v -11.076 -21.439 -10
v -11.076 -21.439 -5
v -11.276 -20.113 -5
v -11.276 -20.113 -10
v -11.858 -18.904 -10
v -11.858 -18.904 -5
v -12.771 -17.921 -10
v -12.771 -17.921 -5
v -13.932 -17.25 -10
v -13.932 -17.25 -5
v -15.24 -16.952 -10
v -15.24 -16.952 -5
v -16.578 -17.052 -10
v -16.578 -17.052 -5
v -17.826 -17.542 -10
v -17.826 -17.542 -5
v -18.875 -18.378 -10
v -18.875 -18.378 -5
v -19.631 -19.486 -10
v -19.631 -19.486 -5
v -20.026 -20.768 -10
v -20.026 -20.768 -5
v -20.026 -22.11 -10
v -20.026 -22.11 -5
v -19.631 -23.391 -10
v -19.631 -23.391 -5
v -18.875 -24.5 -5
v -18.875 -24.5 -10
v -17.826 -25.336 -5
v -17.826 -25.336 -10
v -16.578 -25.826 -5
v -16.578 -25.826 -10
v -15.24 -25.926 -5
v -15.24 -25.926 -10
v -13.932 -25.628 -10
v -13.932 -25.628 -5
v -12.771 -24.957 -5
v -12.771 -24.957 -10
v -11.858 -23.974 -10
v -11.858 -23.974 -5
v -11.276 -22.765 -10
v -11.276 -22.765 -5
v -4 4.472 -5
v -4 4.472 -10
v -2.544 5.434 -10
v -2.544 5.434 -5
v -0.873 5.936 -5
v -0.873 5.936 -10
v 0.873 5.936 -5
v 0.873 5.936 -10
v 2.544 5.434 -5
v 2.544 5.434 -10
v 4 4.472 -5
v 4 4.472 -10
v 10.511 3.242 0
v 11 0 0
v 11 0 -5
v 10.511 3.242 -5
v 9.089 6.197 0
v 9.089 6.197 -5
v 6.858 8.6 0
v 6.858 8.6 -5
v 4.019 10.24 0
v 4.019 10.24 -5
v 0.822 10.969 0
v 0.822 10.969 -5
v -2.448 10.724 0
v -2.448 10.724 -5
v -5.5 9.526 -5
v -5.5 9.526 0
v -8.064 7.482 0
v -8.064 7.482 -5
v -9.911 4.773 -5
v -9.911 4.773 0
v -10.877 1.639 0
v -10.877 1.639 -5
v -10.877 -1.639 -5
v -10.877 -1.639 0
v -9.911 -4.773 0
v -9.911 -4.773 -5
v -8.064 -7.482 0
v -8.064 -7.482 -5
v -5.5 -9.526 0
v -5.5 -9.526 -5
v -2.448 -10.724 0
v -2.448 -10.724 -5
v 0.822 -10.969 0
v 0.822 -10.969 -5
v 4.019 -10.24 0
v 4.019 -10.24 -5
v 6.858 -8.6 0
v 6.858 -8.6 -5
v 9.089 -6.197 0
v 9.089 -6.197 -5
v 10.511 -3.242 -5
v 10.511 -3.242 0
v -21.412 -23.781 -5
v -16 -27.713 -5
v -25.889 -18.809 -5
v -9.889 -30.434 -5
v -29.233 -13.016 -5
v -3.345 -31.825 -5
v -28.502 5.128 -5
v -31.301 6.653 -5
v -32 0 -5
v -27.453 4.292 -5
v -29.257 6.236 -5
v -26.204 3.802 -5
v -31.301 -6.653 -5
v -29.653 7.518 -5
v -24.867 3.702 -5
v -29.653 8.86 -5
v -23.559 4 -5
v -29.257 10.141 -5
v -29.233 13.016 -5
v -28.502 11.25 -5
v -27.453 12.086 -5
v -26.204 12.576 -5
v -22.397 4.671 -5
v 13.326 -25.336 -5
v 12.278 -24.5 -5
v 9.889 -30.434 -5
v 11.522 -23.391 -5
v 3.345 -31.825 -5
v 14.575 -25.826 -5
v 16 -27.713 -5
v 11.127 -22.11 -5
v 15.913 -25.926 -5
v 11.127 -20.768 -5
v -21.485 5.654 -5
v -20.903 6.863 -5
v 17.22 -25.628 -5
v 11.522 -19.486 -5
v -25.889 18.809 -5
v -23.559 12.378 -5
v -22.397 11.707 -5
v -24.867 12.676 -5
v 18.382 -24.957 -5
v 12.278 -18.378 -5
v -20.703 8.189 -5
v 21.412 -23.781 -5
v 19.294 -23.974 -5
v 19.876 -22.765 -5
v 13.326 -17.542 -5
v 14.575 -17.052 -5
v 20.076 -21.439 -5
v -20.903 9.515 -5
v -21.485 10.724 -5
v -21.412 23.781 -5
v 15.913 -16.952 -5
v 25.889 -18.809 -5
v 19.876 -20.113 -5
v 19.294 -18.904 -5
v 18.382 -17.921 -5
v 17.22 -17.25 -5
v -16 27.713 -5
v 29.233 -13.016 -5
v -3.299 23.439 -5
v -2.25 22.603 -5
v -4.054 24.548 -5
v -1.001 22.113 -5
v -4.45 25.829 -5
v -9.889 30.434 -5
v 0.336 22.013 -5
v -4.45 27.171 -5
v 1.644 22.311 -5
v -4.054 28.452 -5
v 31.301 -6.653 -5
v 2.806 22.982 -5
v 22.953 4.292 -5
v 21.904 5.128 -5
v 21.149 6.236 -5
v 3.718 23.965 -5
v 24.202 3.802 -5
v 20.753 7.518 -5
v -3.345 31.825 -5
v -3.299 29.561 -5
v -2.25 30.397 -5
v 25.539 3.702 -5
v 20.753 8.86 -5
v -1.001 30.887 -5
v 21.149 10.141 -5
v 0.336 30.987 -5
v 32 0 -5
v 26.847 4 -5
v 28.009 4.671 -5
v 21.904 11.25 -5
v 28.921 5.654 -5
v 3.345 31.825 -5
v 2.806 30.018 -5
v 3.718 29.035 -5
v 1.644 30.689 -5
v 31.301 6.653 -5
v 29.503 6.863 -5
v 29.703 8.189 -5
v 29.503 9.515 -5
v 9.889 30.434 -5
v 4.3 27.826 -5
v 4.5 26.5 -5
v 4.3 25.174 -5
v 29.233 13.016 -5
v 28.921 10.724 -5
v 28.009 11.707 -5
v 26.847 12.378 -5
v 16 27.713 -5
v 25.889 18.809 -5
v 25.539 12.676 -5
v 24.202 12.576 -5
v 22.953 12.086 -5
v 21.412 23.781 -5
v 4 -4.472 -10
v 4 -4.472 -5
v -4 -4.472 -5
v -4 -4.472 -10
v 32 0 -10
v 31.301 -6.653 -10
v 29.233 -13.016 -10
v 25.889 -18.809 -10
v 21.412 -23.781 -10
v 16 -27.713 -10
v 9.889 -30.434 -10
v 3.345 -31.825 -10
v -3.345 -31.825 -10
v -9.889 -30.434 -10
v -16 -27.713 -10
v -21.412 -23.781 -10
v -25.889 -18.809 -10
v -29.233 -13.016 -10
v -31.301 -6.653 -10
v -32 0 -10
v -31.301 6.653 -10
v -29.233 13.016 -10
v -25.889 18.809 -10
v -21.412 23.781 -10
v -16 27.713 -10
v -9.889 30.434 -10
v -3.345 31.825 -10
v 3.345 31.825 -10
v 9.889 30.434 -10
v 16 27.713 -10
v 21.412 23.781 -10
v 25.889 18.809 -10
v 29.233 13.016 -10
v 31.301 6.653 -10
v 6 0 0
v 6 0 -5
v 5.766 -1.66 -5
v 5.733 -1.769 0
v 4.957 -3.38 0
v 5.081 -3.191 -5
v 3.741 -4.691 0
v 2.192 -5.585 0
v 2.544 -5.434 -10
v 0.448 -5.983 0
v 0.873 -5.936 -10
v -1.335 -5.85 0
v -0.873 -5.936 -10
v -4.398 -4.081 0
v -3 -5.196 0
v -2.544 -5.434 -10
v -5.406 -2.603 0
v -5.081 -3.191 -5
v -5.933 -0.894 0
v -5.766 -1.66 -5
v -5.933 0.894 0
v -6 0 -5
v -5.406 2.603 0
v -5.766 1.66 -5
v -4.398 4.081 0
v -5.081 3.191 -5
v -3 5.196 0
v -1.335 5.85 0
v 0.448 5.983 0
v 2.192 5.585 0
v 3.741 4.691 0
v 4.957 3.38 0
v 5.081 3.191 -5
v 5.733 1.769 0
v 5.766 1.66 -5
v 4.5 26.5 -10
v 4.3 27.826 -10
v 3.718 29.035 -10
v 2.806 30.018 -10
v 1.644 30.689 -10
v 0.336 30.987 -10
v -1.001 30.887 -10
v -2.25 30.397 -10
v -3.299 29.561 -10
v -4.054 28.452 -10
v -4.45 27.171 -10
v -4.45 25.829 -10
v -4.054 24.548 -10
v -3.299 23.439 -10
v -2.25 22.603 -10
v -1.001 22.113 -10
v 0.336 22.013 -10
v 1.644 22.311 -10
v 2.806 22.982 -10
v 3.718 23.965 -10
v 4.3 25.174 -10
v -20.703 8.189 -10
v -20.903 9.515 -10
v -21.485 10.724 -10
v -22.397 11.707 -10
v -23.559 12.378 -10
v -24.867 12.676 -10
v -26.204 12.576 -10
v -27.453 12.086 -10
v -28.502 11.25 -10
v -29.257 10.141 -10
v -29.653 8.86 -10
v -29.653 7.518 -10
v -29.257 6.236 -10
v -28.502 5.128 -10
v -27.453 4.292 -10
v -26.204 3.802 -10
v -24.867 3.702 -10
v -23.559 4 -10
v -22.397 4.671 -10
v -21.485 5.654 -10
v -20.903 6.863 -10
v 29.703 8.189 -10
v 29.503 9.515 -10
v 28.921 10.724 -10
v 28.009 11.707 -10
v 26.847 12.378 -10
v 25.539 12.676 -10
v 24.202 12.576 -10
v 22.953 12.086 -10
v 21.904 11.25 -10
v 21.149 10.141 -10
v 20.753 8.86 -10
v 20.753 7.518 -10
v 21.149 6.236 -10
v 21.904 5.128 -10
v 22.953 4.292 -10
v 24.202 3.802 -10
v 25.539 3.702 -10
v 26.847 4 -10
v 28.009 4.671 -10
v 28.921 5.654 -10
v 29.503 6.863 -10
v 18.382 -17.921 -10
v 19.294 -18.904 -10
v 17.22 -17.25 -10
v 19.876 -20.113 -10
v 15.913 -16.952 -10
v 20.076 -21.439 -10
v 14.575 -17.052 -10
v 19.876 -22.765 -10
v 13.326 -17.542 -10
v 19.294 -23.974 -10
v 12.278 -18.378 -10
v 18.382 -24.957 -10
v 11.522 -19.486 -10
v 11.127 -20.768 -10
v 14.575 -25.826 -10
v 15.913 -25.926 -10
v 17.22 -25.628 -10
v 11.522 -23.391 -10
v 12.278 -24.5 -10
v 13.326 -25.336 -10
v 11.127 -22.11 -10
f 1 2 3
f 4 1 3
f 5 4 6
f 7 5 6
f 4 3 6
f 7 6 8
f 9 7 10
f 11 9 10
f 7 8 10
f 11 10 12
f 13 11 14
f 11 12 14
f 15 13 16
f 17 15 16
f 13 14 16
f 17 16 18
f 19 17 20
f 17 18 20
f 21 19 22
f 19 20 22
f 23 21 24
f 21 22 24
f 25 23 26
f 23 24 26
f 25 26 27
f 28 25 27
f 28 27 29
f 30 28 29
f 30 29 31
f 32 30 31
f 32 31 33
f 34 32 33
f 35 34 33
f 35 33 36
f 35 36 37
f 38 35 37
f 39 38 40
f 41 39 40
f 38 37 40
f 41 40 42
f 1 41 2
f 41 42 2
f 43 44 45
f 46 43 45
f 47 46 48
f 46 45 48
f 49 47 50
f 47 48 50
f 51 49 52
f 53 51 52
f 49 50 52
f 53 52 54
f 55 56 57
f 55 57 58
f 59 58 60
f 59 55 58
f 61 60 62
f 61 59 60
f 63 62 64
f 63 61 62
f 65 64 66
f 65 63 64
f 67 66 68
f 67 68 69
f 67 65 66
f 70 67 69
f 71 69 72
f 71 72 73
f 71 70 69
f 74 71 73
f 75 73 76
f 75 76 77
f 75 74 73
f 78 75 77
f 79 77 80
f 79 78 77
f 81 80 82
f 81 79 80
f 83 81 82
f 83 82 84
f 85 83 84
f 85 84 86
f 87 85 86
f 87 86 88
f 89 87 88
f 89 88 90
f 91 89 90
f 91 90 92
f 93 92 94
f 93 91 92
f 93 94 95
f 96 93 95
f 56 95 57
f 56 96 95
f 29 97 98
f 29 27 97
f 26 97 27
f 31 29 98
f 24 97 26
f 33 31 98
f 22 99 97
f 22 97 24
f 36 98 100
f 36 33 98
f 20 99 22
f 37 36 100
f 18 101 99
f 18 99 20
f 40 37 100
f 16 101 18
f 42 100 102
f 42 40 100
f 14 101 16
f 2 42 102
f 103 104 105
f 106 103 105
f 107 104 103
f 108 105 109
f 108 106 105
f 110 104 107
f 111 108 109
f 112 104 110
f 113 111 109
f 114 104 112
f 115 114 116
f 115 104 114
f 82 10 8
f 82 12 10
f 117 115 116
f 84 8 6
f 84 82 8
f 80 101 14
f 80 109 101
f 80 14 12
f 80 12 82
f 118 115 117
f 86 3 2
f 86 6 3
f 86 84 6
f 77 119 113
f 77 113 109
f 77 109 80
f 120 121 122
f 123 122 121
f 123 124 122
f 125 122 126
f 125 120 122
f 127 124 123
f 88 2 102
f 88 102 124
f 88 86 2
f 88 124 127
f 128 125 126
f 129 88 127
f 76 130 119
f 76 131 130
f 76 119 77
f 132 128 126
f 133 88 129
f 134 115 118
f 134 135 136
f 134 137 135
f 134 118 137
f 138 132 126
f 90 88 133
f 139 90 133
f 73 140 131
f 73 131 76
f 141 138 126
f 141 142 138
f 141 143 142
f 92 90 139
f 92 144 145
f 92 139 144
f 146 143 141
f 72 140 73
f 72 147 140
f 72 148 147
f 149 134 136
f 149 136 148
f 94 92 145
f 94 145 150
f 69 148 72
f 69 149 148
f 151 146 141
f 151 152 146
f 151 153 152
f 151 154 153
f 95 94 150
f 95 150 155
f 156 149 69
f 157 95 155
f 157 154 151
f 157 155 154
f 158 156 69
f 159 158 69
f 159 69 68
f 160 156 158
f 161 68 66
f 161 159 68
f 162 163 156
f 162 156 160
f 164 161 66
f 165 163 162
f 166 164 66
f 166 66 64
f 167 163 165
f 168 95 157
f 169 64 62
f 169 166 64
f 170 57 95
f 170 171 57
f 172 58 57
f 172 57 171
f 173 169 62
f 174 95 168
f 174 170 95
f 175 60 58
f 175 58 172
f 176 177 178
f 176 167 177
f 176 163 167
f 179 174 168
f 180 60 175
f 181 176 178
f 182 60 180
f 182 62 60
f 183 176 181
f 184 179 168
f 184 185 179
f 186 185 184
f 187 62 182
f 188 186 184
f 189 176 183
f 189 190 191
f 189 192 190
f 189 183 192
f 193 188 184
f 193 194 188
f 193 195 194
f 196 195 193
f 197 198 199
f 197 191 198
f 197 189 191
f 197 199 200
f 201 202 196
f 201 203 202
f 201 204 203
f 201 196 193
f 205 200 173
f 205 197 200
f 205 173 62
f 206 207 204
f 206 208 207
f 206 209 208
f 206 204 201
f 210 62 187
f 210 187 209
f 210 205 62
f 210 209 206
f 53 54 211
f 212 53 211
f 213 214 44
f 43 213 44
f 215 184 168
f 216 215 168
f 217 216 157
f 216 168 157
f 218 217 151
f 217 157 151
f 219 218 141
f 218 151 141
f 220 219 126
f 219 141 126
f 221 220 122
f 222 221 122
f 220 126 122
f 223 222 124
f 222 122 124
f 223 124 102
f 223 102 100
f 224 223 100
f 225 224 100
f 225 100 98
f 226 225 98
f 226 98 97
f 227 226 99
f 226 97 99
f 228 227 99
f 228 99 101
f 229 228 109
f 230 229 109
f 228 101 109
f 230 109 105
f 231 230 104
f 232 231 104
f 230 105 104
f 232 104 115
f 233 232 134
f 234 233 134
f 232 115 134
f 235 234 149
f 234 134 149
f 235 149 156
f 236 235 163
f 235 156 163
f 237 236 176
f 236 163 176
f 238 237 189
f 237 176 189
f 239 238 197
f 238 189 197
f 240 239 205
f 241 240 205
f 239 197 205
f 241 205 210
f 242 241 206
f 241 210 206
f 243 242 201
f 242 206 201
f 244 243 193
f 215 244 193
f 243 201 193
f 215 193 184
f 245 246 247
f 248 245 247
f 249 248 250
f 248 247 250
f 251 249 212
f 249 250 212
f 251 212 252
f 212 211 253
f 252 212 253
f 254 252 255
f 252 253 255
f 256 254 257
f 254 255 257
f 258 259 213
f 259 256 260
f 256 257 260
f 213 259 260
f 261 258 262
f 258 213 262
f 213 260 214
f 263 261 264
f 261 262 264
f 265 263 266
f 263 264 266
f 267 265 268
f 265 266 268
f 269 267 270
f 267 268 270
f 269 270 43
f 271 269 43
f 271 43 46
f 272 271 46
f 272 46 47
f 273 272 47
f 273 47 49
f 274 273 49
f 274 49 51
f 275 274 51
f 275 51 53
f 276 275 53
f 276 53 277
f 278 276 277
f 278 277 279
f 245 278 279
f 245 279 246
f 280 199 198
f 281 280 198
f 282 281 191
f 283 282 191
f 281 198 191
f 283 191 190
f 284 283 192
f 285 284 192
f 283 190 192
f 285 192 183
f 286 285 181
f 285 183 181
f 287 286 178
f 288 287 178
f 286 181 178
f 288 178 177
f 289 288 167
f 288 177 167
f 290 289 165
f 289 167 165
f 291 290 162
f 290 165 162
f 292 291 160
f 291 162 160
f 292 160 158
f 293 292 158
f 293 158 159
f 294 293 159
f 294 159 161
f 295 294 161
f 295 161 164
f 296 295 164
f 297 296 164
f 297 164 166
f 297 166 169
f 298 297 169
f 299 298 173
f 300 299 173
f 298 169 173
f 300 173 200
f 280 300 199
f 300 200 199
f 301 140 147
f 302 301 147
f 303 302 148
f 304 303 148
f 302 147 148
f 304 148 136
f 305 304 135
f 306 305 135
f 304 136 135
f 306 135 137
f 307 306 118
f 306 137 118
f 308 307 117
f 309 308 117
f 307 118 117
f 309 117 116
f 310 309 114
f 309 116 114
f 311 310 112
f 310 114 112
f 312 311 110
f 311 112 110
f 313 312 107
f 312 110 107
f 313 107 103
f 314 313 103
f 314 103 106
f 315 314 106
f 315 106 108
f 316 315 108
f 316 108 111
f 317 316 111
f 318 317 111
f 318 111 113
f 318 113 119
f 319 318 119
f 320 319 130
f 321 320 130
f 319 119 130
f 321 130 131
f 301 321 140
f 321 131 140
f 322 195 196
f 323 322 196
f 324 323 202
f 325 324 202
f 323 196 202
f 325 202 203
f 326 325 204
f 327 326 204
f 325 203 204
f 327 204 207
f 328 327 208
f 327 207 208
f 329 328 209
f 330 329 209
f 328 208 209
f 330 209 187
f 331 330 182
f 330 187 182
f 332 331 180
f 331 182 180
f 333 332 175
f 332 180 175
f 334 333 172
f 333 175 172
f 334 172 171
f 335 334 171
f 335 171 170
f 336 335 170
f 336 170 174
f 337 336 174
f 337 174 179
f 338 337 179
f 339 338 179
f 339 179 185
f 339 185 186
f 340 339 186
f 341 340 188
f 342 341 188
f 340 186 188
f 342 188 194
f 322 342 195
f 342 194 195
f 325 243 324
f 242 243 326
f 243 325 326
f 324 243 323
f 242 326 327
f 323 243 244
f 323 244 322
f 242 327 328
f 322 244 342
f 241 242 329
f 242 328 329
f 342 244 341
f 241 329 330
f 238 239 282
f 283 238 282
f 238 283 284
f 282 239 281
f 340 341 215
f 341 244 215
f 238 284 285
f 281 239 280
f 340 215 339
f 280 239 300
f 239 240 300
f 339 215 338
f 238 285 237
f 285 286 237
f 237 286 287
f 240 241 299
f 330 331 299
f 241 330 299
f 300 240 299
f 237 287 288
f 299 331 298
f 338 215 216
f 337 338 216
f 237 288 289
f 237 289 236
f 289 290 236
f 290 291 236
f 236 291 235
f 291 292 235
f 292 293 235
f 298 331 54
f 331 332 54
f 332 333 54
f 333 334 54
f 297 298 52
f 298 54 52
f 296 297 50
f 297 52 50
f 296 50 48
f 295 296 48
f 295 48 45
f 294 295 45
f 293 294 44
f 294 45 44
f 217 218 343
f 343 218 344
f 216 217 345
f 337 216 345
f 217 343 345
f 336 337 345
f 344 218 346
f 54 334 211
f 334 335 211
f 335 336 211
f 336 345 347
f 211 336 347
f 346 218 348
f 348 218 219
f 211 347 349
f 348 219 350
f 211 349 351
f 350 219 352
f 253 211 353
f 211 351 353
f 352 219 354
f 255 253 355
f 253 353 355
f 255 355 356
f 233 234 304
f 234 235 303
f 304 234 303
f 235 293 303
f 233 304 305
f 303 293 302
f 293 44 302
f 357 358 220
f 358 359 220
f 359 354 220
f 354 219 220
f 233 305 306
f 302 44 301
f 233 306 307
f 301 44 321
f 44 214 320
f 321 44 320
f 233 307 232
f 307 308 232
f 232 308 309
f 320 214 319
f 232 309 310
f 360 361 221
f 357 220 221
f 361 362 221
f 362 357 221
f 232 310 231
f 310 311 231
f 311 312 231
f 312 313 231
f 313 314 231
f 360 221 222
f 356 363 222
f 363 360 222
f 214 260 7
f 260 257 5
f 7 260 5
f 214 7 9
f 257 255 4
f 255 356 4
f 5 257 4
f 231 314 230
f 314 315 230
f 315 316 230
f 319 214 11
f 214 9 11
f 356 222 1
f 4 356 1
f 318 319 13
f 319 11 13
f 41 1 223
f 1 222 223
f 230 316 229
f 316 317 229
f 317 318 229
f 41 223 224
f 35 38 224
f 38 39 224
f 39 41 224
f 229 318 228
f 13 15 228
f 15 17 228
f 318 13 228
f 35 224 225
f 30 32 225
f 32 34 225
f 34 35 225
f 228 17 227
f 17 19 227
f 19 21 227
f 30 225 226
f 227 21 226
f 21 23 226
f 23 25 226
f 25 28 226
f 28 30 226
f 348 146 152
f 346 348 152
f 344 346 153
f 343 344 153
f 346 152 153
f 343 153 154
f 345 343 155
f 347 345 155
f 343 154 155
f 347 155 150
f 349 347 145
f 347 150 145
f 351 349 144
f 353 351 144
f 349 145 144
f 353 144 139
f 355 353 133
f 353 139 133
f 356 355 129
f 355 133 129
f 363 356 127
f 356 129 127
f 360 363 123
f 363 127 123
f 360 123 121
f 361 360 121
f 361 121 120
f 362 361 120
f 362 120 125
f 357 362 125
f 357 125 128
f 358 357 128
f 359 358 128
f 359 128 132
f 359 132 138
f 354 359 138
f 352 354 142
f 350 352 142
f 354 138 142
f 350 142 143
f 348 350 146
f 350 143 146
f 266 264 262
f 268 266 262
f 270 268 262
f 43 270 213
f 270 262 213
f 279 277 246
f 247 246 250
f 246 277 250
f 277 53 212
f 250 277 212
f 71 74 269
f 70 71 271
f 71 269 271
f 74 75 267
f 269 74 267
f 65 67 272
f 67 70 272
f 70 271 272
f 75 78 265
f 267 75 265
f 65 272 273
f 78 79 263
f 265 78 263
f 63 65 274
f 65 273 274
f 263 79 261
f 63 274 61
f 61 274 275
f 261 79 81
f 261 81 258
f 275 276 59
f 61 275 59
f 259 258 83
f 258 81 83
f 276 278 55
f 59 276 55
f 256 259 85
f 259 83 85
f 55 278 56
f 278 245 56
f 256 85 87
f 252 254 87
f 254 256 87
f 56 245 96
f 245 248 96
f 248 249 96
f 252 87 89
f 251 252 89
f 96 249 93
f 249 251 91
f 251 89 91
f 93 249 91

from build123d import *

# Parameters (mm, degrees)
CUT_EXTRUDE1_DEPTH = 5
SKETCH3_R          = 32
SKETCH3_R_2        = 11
CUT_EXTRUDE2_DEPTH = 5
SKETCH4_R          = 4.5
CUT_EXTRUDE3_DEPTH = 5


with BuildPart() as part:
    # Sketch1 → Revolve1 (revolve)
    with BuildSketch(Plane(origin=(0, 0, 0), x_dir=(1, 0, 0), z_dir=(0, 1, 0))):
        Polygon((4, 10), (32, 10), (32, 0), (6, 0), (6, 5), (4, 5), align=None)
    revolve(axis=Axis((0, 0, 0), (0, 0, -1)))

    # Sketch2 → Cut-Extrude1 (cut)
    with BuildSketch(Plane(origin=(0, 0, -10), x_dir=(-1, 0, 0), z_dir=(0, 0, -1))):
        with BuildLine():
            Line((-4, 4.472135955), (-4, -4.472135955))
            ThreePointArc((-4, -4.472135955), (0, -6), (4, -4.472135955))
            Line((4, -4.472135955), (4, 4.472135955))
            ThreePointArc((4, 4.472135955), (0, 6), (-4, 4.472135955))
        make_face()
    extrude(amount=-CUT_EXTRUDE1_DEPTH, mode=Mode.SUBTRACT)

    # Sketch3 → Cut-Extrude2 (cut)
    with BuildSketch(Plane.XY):
        Circle(SKETCH3_R)
        Circle(SKETCH3_R_2, mode=Mode.SUBTRACT)
    extrude(amount=-CUT_EXTRUDE2_DEPTH, mode=Mode.SUBTRACT)

    # Sketch4 → Cut-Extrude3 (cut)
    with BuildSketch(Plane.XY.offset(-5)):
        with Locations((0, 26.5)):
            Circle(SKETCH4_R)
        with Locations((25.202997682, 8.188950351)):
            Circle(SKETCH4_R)
        with Locations((15.576309186, -21.438950351)):
            Circle(SKETCH4_R)
        with Locations((-15.576309186, -21.438950351)):
            Circle(SKETCH4_R)
        with Locations((-25.202997682, 8.188950351)):
            Circle(SKETCH4_R)
    extrude(amount=-CUT_EXTRUDE3_DEPTH, mode=Mode.SUBTRACT)


solid = part.part
